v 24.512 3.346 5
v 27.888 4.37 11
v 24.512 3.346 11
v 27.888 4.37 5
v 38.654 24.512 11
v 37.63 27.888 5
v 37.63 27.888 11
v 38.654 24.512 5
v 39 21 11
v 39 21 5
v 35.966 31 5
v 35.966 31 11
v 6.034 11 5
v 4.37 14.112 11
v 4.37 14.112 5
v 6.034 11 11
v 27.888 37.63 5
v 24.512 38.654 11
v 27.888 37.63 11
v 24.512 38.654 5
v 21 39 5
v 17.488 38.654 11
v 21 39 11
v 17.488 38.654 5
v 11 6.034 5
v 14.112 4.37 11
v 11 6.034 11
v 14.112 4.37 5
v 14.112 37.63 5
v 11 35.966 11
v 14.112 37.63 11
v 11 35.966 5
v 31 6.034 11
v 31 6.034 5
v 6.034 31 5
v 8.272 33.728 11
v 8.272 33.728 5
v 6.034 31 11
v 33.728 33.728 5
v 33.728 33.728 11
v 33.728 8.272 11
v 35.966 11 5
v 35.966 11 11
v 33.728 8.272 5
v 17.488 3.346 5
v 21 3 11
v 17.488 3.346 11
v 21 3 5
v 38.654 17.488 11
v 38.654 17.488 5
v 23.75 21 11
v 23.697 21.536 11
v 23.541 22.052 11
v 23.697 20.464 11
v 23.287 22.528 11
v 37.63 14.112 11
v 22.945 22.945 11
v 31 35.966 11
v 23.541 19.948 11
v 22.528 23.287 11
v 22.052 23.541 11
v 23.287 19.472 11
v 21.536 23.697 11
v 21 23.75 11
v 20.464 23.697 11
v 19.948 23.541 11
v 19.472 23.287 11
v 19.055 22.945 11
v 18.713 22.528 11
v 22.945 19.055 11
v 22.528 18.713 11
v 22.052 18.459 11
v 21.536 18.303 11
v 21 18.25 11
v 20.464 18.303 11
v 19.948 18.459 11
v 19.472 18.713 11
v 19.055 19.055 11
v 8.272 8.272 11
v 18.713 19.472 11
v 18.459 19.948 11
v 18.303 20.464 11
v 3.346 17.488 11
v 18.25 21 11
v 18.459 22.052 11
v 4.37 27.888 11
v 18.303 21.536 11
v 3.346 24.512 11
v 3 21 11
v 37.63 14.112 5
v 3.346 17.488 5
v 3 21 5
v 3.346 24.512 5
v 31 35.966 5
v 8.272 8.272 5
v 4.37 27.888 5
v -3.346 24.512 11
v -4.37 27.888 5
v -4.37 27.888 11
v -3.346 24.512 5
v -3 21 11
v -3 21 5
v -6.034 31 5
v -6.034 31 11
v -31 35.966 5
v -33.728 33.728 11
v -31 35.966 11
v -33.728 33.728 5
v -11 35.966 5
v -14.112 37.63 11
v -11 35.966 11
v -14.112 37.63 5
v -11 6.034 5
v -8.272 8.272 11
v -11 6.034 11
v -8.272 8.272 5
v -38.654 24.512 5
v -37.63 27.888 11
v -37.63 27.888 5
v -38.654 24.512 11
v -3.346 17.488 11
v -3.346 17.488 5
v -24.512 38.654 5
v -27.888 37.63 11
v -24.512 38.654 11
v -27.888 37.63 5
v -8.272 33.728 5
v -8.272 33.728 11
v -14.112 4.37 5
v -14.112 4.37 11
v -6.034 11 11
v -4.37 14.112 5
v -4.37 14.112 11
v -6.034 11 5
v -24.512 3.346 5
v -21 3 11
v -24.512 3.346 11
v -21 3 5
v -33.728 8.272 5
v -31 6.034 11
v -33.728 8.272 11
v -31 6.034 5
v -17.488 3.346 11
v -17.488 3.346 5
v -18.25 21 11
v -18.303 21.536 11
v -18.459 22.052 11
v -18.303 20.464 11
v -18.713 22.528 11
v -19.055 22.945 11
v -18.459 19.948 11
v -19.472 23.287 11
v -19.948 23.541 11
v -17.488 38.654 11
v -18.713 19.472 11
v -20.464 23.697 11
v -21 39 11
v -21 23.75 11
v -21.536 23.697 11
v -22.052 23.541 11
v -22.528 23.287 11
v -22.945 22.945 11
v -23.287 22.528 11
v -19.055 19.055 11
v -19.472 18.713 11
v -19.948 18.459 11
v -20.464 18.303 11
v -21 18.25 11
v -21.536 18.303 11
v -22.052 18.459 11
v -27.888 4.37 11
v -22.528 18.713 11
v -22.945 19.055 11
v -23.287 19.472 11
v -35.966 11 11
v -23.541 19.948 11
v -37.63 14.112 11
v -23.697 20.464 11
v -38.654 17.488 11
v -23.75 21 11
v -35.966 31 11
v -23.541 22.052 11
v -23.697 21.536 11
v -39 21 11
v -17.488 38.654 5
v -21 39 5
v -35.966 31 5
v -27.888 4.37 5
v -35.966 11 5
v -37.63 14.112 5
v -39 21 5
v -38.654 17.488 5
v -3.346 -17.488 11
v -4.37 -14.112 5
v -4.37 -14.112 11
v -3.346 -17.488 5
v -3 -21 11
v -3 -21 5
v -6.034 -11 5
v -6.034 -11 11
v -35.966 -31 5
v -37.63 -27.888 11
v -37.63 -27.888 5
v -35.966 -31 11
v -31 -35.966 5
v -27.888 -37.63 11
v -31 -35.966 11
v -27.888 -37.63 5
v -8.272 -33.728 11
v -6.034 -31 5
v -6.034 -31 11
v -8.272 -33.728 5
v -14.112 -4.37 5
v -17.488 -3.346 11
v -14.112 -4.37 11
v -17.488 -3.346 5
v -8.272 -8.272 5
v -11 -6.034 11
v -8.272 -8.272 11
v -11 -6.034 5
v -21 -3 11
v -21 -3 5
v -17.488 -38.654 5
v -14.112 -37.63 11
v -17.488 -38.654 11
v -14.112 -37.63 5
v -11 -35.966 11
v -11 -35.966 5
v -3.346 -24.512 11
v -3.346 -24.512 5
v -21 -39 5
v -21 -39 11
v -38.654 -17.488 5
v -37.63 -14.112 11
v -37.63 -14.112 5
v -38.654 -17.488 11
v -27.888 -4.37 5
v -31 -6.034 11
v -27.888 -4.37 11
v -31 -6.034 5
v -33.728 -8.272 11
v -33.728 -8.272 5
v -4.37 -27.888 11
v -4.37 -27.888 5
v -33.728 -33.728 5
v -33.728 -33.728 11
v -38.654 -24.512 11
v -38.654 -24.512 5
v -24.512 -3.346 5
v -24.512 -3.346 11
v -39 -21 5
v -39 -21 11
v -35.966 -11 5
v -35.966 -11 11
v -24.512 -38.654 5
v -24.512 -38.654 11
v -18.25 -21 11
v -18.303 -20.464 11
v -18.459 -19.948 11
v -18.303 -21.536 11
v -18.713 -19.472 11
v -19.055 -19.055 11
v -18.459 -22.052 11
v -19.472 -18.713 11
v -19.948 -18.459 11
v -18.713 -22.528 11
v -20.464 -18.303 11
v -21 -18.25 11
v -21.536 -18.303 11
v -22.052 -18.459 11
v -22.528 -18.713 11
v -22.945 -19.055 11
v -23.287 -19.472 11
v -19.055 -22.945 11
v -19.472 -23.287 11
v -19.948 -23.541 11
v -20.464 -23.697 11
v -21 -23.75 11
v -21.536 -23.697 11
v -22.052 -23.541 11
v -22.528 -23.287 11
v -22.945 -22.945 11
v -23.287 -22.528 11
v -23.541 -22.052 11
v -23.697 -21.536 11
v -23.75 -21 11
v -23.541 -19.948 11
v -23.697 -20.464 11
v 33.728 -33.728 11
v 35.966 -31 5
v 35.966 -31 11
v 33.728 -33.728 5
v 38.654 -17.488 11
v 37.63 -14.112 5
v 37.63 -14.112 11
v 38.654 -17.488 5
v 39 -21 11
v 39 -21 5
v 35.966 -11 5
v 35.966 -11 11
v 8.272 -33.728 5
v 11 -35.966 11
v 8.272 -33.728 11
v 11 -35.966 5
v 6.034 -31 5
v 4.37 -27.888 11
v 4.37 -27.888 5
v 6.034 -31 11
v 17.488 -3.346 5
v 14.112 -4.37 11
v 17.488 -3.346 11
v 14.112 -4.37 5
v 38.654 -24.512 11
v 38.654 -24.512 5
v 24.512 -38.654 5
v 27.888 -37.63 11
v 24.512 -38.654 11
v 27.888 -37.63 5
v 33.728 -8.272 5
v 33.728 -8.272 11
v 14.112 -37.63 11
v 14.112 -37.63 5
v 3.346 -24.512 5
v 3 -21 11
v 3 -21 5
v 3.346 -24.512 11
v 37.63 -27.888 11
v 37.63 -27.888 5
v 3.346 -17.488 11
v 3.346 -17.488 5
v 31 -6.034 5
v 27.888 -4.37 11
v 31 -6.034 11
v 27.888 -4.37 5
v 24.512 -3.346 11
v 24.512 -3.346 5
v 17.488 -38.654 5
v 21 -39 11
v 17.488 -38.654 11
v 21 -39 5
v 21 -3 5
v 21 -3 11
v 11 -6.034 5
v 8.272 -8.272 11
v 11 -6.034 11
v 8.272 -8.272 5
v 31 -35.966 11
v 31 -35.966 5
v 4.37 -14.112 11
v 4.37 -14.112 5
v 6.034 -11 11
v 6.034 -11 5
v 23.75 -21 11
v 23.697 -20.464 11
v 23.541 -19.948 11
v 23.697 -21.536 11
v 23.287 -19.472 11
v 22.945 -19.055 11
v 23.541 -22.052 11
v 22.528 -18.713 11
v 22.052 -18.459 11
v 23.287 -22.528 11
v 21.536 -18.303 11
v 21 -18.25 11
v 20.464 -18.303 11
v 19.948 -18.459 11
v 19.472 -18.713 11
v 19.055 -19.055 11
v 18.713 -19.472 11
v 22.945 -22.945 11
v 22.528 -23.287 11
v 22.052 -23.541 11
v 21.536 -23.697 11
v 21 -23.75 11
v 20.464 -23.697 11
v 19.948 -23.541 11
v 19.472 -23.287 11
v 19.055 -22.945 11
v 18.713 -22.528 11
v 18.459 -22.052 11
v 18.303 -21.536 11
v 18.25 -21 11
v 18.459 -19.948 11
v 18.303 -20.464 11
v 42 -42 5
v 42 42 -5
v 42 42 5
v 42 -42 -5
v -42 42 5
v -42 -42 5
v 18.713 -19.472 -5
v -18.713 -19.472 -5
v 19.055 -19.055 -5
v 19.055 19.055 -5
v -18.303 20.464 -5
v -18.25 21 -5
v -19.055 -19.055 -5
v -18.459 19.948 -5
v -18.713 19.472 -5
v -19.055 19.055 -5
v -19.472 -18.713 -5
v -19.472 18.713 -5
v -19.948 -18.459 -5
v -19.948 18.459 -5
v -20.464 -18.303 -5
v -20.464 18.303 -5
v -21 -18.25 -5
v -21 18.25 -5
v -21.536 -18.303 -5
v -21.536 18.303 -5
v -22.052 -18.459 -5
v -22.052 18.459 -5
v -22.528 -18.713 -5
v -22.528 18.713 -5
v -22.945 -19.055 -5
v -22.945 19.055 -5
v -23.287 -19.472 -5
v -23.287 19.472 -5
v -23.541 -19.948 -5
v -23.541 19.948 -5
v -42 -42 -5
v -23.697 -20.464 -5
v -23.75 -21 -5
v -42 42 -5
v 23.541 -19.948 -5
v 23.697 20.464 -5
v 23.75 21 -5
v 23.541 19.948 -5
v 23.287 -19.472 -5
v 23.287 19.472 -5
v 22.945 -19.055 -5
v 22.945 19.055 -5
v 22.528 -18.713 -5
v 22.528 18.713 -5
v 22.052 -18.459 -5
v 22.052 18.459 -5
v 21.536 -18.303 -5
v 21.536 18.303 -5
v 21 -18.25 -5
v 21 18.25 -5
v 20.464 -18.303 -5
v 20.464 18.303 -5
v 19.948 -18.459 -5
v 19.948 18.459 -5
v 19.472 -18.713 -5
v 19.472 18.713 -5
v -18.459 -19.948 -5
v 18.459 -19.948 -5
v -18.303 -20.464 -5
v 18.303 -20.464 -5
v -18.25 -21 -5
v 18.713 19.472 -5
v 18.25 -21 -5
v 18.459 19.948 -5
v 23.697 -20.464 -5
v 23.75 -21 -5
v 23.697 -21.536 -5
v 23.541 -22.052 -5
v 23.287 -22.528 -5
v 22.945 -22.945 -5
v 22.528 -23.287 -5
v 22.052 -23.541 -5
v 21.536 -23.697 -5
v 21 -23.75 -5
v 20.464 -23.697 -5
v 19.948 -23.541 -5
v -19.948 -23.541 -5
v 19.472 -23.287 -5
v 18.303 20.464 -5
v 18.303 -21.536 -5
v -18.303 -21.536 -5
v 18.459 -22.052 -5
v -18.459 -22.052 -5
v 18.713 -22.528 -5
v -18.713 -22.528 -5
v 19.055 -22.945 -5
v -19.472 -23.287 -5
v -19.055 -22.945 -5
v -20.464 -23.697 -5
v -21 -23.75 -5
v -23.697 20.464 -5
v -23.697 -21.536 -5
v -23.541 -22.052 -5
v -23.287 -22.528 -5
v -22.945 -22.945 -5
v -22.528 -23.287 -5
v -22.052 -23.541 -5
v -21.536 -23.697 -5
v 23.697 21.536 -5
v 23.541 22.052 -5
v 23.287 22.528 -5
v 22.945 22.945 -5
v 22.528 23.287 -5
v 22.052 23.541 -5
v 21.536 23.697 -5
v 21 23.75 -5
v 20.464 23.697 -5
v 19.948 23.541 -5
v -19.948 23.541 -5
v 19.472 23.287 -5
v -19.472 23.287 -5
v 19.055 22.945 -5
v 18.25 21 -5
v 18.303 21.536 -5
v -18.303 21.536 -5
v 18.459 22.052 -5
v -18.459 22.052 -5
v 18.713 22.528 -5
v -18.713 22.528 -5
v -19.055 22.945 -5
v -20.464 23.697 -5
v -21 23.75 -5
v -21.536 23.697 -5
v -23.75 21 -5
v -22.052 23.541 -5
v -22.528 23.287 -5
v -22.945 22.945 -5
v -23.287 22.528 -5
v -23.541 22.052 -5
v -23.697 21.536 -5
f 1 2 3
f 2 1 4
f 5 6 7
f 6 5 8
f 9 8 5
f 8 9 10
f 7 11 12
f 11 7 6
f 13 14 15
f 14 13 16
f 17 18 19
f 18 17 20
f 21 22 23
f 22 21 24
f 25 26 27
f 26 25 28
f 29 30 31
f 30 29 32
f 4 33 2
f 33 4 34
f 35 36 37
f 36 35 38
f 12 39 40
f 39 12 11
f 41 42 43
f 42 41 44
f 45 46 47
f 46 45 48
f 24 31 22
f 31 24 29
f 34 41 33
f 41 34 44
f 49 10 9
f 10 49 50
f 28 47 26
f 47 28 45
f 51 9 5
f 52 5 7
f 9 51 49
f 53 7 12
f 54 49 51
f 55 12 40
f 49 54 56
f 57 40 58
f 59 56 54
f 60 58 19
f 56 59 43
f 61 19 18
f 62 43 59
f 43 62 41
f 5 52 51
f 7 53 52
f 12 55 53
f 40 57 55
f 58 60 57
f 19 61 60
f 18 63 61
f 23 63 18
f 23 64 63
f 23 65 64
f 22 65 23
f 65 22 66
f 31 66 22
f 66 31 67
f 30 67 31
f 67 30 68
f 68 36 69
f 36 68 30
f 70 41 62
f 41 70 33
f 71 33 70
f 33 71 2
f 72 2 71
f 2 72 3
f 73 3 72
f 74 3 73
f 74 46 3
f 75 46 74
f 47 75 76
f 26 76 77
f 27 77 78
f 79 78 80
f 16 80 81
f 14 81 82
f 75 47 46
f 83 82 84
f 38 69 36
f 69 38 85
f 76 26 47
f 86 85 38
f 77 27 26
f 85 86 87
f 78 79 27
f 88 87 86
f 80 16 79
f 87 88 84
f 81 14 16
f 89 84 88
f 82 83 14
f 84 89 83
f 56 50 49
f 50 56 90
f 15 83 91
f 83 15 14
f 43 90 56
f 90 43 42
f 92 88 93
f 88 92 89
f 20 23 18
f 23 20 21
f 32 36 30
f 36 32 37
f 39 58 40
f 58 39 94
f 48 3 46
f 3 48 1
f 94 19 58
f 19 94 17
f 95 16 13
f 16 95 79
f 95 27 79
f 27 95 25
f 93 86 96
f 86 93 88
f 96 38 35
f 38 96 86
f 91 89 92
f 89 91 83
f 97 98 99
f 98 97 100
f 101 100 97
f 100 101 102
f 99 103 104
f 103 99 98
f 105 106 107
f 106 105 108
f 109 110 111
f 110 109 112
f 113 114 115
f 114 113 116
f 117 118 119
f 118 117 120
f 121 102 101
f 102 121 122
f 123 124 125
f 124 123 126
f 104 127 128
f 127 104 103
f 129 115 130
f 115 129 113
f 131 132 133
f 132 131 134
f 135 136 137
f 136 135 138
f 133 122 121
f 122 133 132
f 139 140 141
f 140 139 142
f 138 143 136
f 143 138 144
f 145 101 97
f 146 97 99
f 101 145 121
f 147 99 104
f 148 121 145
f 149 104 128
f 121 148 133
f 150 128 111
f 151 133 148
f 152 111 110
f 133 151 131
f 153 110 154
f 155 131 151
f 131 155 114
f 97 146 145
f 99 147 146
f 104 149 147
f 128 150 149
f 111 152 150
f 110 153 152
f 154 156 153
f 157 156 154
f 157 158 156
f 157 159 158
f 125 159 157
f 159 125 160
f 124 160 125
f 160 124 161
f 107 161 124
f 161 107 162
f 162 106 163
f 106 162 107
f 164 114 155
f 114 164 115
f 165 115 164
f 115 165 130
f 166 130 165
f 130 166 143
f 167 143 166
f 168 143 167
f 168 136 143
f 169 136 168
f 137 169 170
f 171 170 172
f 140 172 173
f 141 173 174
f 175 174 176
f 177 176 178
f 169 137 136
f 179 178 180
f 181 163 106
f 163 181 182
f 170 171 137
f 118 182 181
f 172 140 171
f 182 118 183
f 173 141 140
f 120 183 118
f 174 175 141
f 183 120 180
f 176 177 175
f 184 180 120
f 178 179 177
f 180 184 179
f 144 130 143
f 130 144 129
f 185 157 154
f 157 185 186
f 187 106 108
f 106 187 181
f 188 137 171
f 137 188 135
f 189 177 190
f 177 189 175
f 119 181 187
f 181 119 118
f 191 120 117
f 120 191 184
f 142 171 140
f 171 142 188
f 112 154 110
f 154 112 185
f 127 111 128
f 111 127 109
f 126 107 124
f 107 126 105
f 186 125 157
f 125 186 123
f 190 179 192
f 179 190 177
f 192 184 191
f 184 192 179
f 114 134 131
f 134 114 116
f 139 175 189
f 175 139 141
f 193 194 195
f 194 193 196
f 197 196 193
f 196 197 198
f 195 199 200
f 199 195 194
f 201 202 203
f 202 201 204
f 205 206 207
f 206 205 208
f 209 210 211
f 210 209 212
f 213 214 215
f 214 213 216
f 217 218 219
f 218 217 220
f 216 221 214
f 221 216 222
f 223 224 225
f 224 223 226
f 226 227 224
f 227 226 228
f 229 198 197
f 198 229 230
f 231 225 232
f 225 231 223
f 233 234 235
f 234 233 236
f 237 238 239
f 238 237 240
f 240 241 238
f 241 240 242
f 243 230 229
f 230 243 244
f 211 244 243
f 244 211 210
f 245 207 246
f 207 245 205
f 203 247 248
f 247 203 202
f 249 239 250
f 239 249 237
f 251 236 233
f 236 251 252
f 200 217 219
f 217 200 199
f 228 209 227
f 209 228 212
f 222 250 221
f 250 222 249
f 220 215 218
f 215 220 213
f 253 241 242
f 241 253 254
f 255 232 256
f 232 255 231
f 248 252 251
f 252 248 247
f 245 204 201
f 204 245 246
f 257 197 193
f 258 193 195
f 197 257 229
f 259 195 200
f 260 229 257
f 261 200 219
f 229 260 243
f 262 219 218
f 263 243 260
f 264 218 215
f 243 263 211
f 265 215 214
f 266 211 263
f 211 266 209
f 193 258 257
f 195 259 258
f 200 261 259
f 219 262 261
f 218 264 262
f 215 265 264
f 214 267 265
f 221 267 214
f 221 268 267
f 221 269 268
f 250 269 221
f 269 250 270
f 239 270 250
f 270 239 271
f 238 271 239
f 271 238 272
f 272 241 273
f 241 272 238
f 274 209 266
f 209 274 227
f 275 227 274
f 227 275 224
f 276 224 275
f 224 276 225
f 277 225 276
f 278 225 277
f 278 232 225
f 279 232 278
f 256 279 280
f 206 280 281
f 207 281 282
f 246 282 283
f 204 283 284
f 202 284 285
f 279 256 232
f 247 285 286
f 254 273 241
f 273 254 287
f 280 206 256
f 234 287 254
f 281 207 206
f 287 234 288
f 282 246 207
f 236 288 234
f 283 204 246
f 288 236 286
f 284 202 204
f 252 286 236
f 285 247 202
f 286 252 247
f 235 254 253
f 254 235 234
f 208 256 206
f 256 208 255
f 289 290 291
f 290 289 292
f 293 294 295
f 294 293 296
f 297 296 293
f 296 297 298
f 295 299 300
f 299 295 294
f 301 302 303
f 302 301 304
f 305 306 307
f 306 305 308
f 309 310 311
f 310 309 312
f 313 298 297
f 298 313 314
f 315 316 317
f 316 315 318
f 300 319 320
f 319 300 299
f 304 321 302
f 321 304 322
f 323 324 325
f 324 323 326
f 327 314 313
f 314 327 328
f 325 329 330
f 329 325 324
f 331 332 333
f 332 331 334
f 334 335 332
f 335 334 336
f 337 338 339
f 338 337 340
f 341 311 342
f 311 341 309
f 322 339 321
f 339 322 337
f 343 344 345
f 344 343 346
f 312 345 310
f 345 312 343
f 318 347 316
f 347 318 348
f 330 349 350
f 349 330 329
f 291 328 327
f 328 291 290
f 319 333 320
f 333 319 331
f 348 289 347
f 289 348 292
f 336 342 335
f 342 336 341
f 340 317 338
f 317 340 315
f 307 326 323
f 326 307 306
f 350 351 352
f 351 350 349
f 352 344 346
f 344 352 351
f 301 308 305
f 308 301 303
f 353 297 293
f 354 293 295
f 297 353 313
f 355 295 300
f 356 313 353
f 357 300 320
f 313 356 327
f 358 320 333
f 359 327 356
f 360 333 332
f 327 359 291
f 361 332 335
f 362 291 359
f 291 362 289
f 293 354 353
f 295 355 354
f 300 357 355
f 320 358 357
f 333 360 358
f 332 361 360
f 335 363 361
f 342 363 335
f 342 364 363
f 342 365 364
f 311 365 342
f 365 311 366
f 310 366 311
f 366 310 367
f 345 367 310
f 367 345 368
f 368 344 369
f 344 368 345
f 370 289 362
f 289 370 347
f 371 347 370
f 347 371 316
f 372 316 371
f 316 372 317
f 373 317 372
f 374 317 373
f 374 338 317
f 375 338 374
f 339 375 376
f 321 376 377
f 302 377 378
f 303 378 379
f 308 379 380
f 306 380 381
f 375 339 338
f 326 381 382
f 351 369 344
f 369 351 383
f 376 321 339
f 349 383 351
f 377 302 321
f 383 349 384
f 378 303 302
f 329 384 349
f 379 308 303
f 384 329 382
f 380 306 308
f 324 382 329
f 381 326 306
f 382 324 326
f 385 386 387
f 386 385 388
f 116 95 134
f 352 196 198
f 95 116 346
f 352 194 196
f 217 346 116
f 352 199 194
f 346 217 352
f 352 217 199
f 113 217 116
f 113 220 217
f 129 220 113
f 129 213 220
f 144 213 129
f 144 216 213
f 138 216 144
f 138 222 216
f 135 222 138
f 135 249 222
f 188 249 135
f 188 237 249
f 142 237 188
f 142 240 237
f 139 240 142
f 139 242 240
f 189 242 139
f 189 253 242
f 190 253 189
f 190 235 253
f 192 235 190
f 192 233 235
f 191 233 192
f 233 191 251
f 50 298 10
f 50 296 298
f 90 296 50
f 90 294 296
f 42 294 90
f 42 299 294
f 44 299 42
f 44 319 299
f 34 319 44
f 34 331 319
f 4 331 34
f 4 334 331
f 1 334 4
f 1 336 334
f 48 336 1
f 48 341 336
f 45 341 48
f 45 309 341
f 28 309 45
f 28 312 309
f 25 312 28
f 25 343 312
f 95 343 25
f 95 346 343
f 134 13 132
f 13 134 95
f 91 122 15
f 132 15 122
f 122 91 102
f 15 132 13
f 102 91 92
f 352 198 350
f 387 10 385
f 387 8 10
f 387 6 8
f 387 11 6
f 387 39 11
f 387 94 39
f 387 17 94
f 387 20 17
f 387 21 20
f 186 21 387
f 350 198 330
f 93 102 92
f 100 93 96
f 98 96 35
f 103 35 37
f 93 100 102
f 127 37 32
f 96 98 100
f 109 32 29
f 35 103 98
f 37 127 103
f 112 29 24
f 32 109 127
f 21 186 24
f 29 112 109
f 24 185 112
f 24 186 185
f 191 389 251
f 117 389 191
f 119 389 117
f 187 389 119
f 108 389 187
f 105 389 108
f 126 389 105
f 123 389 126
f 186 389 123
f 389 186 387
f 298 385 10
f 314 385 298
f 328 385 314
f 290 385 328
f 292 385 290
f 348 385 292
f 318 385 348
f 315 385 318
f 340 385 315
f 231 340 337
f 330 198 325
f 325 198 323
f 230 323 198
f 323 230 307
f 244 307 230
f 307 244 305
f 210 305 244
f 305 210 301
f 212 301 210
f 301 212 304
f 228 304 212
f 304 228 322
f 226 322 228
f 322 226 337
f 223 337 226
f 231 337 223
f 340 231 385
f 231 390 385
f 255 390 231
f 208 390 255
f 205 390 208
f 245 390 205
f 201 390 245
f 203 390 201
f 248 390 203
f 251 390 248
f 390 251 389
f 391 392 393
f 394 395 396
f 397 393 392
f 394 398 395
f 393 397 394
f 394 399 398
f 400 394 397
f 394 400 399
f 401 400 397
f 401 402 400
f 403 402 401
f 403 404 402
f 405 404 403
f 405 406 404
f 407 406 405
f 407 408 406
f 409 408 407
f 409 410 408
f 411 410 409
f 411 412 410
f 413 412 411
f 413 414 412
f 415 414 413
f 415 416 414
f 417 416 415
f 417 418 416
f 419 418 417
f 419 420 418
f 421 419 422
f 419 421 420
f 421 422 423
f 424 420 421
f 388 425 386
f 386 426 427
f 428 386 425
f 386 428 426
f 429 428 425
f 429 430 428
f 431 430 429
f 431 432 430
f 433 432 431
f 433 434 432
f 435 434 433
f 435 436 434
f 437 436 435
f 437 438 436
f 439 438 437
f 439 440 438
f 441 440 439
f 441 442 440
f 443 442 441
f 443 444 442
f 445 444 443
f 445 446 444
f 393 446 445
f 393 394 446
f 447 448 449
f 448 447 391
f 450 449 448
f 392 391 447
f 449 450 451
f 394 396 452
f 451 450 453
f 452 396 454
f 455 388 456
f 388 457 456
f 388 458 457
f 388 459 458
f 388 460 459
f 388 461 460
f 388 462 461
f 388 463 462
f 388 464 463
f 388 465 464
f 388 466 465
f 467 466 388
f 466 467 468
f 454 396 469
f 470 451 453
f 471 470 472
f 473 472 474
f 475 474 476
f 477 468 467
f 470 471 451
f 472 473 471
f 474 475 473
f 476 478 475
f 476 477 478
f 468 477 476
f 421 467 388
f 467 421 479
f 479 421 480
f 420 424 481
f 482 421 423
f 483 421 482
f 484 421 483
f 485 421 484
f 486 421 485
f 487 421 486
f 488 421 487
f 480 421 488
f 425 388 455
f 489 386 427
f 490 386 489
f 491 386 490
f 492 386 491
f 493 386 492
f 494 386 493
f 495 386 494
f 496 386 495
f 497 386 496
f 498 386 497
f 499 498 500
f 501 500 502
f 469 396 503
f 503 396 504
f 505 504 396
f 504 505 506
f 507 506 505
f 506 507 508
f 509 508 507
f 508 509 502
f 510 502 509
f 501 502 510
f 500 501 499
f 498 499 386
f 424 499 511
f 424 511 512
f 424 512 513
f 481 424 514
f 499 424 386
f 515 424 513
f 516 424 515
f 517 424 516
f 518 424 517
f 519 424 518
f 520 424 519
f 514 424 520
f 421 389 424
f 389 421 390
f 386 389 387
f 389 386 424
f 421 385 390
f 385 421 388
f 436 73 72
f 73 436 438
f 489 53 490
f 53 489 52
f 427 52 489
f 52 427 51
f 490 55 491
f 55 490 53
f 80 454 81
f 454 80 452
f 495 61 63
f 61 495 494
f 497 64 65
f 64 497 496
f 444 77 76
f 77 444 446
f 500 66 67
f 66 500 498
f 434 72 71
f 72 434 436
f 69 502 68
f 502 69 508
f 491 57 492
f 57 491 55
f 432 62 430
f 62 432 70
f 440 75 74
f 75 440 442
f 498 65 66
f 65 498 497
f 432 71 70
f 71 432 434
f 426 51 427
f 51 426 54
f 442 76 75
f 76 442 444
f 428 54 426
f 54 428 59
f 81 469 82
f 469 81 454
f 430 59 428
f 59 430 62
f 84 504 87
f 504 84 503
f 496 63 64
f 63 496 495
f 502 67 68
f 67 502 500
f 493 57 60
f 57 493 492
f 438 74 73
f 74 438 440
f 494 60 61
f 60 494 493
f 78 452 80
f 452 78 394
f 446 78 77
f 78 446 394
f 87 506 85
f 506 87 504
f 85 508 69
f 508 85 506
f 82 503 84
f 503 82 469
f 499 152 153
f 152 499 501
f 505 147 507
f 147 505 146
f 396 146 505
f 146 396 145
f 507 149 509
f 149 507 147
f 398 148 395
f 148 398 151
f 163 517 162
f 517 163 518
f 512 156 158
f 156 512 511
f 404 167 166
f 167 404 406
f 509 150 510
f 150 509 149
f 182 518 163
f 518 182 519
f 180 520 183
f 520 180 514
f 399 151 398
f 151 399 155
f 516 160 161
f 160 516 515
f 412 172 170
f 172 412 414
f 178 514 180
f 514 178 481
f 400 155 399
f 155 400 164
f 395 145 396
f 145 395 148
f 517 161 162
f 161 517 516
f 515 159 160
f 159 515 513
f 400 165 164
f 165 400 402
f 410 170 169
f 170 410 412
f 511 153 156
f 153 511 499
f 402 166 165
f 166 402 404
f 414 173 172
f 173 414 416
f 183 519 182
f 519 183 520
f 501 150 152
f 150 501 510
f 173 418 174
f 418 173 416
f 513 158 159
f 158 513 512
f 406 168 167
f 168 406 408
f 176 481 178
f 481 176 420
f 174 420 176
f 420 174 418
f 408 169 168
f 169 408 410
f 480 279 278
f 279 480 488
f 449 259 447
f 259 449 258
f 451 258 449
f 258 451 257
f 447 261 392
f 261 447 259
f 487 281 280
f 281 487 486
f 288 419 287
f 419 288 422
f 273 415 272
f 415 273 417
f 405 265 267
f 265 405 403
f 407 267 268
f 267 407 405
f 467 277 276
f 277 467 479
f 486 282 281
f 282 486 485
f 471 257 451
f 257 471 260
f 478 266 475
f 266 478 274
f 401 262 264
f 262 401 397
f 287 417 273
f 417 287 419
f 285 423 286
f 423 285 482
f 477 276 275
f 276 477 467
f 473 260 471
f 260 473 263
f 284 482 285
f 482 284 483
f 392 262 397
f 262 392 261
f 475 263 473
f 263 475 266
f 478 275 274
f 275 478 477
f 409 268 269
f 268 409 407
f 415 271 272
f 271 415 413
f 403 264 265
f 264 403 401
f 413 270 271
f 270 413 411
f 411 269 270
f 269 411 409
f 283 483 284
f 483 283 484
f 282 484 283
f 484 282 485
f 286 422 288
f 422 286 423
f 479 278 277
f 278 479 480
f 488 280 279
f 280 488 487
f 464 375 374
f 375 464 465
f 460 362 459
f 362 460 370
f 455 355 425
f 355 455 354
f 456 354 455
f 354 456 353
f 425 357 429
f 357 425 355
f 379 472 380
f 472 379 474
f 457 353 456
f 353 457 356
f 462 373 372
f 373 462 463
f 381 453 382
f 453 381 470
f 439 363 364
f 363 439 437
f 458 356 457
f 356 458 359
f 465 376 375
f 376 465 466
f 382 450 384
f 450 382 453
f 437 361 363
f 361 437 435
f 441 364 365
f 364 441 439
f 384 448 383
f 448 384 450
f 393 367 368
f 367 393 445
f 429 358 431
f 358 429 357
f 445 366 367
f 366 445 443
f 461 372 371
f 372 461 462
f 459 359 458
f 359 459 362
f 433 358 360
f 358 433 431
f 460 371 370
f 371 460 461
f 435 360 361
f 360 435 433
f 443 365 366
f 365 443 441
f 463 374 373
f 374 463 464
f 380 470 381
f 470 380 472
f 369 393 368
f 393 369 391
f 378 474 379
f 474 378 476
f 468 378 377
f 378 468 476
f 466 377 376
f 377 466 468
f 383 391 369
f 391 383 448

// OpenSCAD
$fn = 32;

// ----------------------------------------------------------------------
// Anchor pads 84 x 84 x 16
// four corner bosses with anchor holes
// ----------------------------------------------------------------------

// --- parameters (mm) ---
plate = [84, 84, 10];  // base plate size (x, y, z)
pads = 4;              // boss count, one per corner
edge = 21;             // boss centre offset from the plate edge
boss_d = 36;           // boss diameter
boss_h = 6;            // boss height above the base plate
hole_d = 5.5;          // hole diameter

// --- derived feature positions (mm) ---
height = plate[2] + boss_h;      // = 16   overall height of the part
corner_x = plate[0] / 2 - edge;  // = 21   boss centre X
corner_y = plate[1] / 2 - edge;  // = 21   boss centre Y
feature_centers = [
  [corner_x, corner_y],
  [-corner_x, corner_y],
  [-corner_x, -corner_y],
  [corner_x, -corner_y]
];   // boss centres, anchor holes are drilled there

// base plate, four bosses standing on it, anchor holes all the way through
difference() {
  union() {
    cube(plate, center = true);
    for (centre = feature_centers)
      translate([centre[0], centre[1], plate[2] / 2 - 1])
        cylinder(d = boss_d, h = boss_h + 1);
  }
  for (centre = feature_centers)
    translate([centre[0], centre[1], -height])
      cylinder(d = hole_d, h = 2 * height + 2);  // through boss and plate
}
